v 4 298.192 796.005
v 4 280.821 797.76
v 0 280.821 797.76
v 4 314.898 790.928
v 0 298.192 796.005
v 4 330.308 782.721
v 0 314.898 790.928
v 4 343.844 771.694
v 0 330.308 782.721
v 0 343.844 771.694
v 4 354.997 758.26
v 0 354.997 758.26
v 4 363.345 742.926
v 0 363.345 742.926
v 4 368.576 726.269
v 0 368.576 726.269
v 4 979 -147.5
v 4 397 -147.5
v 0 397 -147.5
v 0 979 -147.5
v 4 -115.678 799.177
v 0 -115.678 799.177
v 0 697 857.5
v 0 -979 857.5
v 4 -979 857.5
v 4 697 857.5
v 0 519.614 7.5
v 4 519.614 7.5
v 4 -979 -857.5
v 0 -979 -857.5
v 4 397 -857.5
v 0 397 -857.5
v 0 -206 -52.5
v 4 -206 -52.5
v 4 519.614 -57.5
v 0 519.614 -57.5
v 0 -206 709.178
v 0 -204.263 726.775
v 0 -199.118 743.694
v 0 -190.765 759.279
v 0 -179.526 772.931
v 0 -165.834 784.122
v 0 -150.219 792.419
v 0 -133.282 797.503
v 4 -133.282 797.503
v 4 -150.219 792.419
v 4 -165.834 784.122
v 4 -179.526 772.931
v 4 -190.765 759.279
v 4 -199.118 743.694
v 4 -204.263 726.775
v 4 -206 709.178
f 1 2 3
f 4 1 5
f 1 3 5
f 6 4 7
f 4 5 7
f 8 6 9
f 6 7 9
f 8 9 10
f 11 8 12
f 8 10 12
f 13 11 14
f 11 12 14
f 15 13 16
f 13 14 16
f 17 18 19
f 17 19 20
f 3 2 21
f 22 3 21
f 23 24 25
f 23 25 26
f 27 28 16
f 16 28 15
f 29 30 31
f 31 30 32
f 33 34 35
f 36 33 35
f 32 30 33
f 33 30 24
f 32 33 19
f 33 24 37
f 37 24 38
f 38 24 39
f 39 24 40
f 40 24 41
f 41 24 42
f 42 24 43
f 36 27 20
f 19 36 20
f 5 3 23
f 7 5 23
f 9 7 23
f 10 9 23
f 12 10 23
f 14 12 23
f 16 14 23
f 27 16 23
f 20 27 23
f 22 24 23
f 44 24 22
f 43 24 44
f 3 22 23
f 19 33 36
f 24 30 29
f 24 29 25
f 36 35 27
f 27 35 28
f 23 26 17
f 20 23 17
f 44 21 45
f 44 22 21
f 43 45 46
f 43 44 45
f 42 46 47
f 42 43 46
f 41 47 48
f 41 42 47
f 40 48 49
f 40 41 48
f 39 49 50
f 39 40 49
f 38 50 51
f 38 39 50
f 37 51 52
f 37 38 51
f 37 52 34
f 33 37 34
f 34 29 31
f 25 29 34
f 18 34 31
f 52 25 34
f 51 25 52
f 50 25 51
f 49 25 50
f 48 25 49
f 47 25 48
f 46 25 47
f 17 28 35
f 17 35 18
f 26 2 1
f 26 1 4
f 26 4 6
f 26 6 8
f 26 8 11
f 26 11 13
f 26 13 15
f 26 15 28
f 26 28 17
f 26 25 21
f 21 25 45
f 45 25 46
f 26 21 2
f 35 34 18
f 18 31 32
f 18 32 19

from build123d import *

# Parameters (mm, degrees)
F0_W     = 1958
F0_H     = 1715
F1_DEPTH = 4
F2_W     = 582
F2_H     = 710
F3_DEPTH = 4.001
F5_DEPTH = 4.001
F6_R     = 90


with BuildPart() as f1:
    # F0 (on Right) → F1 (new body)
    with BuildSketch(Plane.YZ):
        Rectangle(F0_W, F0_H)
    extrude(amount=F1_DEPTH)

    # F2 (on face) → F3 (cut, through all)
    with BuildSketch(Plane.YZ.offset(4)):
        Polygon((697, 857.5), (979, -147.5), (979, 857.5), align=None)
        with Locations((688, -502.5)):
            Rectangle(F2_W, F2_H)
    extrude(amount=-F3_DEPTH, mode=Mode.SUBTRACT)

    # F4 (on face) → F5 (cut, through all)
    with BuildSketch(Plane.YZ.offset(4)):
        Polygon((353.608048, 797.5), (-206, 799.5), (-206, -52.5), (519.614009, -57.5), (519.614009, 7.5), align=None)
    extrude(amount=-F5_DEPTH, mode=Mode.SUBTRACT)

    # F6
    f6_edges = [f1.edges().sort_by_distance(p)[0] for p in [
        (2, -206, 799.5),
        (2, 353.608048, 797.5),
    ]]
    fillet(f6_edges, radius=F6_R)


solid = f1.part
